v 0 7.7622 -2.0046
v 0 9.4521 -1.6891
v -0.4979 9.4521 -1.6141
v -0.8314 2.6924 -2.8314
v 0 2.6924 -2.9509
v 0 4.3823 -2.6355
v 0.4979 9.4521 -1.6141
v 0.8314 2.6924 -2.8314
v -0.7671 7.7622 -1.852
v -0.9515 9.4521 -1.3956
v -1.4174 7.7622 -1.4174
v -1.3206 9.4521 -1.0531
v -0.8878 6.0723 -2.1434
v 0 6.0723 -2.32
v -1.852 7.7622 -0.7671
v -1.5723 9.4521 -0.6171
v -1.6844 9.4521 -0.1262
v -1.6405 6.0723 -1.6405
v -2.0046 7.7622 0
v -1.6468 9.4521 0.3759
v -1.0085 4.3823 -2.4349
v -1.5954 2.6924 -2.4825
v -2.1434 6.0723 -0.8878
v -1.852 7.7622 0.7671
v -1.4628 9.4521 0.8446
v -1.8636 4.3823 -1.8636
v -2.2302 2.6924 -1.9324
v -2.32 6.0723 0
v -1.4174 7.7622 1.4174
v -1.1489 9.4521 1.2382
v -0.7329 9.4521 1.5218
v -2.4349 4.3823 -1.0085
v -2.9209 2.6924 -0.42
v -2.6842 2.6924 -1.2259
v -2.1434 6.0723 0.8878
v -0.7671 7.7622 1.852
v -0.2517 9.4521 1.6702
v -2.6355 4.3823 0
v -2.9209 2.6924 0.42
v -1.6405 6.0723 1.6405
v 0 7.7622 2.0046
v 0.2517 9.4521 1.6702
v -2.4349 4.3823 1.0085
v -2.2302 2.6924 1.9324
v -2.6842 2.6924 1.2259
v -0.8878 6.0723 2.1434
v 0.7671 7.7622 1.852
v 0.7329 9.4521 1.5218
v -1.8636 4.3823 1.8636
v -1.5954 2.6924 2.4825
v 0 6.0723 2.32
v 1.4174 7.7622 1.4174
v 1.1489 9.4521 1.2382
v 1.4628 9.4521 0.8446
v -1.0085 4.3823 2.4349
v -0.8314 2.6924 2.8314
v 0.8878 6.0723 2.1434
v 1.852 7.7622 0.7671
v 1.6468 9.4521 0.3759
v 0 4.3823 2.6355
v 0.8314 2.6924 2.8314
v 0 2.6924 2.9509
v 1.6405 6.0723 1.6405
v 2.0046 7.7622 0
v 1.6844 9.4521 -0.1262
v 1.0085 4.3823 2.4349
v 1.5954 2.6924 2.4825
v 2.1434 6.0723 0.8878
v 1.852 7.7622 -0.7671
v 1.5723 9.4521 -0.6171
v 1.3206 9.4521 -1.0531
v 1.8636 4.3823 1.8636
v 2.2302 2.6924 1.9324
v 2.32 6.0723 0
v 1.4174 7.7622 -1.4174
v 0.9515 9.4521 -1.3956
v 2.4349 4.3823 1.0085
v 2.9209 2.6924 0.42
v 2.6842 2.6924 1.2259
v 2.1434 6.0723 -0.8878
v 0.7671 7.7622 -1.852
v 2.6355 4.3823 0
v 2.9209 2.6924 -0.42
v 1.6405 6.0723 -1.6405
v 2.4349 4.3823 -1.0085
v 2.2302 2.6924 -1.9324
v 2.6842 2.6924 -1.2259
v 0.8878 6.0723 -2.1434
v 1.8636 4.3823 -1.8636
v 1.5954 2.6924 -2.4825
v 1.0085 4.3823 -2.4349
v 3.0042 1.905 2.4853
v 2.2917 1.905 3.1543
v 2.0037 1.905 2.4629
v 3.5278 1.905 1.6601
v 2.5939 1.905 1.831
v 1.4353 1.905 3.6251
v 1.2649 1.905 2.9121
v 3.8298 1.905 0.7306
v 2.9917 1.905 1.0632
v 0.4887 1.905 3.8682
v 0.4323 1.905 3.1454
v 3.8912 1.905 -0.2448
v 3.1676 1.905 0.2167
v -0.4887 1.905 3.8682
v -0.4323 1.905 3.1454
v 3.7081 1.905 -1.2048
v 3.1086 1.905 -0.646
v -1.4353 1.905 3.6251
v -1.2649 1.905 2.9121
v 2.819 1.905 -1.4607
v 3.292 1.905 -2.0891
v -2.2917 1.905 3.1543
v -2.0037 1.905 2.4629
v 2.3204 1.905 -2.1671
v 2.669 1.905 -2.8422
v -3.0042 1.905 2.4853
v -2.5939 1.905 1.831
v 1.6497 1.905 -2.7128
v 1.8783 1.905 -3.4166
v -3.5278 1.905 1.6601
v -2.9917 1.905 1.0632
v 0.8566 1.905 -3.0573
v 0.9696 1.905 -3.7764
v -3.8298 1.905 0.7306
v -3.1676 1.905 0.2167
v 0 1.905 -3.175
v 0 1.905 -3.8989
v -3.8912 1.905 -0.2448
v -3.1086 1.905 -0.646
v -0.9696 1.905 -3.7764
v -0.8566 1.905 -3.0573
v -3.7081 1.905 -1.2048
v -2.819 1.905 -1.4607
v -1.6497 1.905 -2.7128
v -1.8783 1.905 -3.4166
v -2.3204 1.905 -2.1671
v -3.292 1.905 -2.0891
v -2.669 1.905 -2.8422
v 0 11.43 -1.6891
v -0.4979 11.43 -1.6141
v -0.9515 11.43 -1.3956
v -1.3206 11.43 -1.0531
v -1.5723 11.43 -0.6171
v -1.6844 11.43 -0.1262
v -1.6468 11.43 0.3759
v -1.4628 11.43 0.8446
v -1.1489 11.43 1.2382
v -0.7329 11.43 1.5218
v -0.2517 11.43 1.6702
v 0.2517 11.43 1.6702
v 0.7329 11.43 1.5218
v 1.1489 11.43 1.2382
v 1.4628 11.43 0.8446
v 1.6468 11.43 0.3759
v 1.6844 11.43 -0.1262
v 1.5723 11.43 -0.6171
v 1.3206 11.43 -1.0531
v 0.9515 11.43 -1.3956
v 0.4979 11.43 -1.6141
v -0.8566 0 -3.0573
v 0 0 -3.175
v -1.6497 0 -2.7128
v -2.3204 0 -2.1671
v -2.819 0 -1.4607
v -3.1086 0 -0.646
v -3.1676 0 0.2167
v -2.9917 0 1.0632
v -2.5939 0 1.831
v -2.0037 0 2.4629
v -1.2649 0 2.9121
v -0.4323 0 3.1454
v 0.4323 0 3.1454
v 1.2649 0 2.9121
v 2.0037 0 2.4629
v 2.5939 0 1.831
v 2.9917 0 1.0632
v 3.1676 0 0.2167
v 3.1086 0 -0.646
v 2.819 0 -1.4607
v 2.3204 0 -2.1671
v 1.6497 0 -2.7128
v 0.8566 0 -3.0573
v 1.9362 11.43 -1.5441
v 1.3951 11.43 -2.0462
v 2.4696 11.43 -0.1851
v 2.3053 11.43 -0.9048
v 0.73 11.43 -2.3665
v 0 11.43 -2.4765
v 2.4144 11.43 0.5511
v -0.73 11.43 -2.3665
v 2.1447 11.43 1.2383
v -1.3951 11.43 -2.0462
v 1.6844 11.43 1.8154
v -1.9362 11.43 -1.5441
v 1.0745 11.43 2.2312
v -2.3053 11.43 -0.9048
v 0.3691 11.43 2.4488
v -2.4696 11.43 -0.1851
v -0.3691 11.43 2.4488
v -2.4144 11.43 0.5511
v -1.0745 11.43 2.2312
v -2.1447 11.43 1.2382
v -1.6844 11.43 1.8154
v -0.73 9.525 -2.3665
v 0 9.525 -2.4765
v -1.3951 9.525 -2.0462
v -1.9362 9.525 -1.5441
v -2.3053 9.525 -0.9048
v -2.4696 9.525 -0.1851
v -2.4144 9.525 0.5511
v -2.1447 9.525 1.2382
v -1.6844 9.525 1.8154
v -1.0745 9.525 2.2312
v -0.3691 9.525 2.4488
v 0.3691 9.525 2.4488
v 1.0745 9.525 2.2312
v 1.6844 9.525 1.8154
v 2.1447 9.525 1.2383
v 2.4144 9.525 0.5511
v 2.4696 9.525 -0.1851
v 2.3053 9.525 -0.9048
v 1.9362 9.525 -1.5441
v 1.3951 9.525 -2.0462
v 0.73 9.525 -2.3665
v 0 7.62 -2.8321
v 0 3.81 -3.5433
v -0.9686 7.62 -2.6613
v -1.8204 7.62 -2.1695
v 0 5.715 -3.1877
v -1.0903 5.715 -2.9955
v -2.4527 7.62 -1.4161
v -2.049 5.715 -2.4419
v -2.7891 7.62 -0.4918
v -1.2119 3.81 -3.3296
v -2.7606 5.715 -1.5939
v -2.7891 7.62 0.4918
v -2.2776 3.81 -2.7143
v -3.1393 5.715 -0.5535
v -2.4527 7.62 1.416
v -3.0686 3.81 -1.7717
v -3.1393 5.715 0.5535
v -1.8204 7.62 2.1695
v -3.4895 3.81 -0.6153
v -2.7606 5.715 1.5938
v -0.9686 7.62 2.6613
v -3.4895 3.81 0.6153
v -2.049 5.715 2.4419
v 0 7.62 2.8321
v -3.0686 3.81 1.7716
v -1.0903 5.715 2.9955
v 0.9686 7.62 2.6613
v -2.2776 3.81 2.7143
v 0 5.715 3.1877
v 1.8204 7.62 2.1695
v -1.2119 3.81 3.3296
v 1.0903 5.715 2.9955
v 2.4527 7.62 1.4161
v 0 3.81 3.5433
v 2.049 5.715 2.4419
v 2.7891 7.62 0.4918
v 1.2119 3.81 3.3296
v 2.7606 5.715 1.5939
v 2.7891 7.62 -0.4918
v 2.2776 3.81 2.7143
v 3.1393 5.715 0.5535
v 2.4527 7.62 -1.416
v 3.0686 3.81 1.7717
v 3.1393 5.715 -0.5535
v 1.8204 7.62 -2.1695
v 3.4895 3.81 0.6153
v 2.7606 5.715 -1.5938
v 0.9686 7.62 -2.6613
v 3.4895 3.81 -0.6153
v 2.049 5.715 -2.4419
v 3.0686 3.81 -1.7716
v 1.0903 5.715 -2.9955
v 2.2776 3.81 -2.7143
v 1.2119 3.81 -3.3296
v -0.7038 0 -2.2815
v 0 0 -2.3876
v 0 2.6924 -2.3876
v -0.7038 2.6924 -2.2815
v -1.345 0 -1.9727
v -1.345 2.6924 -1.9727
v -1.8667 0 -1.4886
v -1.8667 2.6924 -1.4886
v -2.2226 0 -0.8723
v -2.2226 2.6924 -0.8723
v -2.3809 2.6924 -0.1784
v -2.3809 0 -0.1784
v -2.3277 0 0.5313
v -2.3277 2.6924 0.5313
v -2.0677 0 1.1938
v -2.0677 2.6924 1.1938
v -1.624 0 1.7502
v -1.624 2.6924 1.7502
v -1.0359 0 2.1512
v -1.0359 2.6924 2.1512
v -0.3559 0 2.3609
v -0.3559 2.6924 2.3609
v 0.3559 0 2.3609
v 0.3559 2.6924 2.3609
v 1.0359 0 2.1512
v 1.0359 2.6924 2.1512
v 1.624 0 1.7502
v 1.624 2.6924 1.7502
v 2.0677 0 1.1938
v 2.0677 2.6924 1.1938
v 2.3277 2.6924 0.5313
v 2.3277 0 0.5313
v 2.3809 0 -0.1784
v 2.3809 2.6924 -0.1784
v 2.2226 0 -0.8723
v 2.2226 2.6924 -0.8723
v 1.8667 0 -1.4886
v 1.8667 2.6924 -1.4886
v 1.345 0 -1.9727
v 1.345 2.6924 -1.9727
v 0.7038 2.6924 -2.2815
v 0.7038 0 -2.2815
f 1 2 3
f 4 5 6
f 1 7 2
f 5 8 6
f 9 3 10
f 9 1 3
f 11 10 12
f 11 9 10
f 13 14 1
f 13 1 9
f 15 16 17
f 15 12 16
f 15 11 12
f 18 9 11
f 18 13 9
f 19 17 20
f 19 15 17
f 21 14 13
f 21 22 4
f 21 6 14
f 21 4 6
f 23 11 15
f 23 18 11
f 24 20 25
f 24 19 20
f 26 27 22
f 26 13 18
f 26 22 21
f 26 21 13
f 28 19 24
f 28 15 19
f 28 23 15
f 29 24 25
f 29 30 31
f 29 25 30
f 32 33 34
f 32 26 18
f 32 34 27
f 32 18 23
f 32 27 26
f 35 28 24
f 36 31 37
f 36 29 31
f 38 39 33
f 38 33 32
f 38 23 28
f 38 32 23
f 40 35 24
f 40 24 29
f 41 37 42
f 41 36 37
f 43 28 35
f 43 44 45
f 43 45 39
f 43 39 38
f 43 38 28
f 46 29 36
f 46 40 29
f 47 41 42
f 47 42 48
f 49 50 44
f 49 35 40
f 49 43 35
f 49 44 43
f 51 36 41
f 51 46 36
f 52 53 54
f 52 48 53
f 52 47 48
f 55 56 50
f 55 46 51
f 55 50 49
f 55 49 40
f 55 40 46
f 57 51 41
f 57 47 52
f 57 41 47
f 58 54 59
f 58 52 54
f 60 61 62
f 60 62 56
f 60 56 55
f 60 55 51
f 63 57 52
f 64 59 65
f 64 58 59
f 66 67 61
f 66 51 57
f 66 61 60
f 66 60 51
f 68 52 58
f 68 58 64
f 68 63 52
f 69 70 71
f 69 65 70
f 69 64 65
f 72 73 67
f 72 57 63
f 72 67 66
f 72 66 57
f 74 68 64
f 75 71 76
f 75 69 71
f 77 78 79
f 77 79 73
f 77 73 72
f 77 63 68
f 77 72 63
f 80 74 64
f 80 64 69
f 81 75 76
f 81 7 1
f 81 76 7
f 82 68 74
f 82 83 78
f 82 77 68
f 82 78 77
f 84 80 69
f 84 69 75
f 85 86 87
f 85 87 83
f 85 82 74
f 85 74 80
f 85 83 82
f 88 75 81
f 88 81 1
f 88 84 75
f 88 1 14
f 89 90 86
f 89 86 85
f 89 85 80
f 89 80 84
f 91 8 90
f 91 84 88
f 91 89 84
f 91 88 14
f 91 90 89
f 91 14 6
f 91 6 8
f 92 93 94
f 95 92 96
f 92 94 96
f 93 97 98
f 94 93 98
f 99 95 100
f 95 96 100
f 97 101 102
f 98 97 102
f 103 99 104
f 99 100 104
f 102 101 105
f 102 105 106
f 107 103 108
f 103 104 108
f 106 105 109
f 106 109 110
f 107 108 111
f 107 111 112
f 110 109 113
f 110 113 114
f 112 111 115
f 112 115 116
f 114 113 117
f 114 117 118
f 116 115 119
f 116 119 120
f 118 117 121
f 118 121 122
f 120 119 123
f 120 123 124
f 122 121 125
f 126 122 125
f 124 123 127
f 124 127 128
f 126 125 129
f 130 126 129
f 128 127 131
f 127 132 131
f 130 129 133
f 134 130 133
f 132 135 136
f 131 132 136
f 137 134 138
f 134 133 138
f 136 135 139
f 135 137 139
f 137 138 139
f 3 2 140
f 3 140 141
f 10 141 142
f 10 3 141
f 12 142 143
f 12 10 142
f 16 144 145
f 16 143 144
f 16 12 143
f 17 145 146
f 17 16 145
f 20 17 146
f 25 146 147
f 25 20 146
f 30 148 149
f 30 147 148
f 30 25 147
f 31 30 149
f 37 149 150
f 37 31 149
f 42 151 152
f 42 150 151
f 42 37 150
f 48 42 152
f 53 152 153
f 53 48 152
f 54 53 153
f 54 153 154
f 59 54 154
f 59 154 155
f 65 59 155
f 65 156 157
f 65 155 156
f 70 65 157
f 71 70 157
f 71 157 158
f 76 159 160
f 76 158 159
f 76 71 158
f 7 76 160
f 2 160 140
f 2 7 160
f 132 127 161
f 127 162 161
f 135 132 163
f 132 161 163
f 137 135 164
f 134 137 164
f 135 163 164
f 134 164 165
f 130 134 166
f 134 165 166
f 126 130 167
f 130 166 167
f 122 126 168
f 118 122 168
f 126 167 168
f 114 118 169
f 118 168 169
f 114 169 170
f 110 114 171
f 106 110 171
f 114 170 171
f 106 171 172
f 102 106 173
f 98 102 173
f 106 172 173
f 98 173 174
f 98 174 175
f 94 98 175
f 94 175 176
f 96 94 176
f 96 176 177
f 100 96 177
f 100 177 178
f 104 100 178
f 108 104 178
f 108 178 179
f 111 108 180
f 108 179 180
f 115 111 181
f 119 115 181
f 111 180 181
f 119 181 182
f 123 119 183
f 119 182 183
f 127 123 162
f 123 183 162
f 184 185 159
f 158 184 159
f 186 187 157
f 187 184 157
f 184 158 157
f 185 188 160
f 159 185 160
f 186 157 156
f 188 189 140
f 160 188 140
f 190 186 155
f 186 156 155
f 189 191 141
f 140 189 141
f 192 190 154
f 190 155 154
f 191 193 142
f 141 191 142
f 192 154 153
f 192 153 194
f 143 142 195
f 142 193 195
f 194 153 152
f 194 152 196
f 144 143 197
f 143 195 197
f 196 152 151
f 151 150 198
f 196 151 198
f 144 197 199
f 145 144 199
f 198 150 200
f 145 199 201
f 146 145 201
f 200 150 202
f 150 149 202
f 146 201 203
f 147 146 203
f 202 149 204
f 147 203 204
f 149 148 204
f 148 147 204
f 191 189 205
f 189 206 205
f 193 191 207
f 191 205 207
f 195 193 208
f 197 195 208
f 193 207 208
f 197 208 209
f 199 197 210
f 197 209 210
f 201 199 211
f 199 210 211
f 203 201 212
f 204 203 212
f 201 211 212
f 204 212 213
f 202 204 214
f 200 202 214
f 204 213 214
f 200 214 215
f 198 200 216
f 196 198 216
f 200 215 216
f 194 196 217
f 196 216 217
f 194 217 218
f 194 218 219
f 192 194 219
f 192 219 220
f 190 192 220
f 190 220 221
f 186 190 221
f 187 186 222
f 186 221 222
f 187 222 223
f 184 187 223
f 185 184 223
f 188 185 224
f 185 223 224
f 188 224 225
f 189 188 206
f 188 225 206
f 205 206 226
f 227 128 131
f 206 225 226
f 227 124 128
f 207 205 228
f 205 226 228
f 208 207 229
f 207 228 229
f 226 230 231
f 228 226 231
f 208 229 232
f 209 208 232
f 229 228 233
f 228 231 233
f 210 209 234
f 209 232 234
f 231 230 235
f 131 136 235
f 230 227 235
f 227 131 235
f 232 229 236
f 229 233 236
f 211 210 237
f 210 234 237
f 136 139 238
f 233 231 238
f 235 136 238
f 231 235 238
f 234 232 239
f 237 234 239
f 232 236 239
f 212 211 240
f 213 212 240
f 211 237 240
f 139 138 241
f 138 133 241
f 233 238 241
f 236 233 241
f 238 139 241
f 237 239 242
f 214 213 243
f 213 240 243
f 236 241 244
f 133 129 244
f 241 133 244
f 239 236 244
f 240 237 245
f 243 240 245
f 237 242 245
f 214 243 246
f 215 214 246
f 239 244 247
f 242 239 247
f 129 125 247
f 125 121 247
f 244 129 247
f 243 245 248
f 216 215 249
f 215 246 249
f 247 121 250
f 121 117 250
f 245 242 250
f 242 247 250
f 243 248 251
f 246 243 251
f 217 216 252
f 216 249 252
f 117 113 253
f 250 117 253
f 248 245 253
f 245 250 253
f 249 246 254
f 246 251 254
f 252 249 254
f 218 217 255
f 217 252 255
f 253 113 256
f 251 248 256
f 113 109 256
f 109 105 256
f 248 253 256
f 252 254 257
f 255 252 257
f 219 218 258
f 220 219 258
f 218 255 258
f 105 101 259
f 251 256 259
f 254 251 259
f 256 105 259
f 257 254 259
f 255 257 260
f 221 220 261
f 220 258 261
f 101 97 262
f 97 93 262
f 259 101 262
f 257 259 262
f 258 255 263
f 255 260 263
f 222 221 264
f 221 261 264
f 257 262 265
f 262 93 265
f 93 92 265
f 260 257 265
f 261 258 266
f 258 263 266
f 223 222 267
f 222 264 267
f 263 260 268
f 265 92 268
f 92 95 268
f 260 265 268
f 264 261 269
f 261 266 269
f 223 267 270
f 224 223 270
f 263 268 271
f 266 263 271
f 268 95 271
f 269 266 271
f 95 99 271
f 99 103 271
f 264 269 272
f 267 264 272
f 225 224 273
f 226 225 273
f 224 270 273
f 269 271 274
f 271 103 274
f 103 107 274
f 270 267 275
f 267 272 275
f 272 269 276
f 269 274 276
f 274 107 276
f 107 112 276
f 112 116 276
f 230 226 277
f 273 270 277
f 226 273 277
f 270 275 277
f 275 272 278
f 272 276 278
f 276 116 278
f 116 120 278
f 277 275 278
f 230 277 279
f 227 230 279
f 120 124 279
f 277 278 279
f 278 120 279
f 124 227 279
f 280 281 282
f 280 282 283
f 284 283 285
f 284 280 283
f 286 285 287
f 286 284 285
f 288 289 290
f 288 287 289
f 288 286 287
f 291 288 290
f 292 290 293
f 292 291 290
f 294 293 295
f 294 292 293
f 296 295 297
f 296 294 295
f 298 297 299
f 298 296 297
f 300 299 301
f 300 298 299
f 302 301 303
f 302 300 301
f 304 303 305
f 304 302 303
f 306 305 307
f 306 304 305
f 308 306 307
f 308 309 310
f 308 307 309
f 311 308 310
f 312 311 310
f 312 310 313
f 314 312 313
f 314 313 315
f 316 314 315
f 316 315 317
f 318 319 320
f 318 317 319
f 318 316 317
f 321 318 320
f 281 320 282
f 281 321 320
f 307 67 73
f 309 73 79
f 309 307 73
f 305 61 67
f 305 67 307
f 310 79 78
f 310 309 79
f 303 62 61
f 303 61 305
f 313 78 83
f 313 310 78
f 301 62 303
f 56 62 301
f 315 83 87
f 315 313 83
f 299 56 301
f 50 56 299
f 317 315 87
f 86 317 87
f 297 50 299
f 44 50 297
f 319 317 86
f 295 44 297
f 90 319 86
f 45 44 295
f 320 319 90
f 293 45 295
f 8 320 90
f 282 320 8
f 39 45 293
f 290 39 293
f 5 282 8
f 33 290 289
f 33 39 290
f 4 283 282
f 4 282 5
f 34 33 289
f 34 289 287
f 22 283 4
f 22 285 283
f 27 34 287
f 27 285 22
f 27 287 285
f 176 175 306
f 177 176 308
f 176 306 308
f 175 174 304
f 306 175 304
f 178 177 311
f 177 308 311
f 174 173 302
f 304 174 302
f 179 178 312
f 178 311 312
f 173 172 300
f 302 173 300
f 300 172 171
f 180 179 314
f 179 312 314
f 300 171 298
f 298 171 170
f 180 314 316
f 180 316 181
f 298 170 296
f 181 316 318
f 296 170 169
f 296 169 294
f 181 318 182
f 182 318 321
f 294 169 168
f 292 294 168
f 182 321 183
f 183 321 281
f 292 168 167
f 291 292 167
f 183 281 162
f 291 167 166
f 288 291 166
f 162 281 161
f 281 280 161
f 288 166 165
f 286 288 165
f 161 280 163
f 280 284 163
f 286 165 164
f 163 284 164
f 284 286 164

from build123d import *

# Parameters (mm, degrees)
SHELL1_T = -0.7874


with BuildPart() as part:
    # Sketch1 → Revolve1 (revolve)
    with BuildSketch(Plane.XY, mode=Mode.PRIVATE) as revolve1_sk:
        Polygon((0, 11.43), (-2.4765, 11.43), (-2.4765, 9.525), (-3.8989, 1.905), (-3.175, 1.905), (-3.175, 0), (0, 0), align=None)
    revolve(revolve1_sk.sketch.rotate(Axis((0, 0, 0), (0, 1, 0)), 270), axis=Axis((0, 0, 0), (0, 1, 0)))

    # Shell1
    shell1_openings = [part.faces().sort_by_distance(p)[0] for p in [
        (0, 0, 0),
        (0, 11.43, 0),
    ]]
    offset(amount=SHELL1_T, openings=shell1_openings, kind=Kind.INTERSECTION)


solid = part.part
